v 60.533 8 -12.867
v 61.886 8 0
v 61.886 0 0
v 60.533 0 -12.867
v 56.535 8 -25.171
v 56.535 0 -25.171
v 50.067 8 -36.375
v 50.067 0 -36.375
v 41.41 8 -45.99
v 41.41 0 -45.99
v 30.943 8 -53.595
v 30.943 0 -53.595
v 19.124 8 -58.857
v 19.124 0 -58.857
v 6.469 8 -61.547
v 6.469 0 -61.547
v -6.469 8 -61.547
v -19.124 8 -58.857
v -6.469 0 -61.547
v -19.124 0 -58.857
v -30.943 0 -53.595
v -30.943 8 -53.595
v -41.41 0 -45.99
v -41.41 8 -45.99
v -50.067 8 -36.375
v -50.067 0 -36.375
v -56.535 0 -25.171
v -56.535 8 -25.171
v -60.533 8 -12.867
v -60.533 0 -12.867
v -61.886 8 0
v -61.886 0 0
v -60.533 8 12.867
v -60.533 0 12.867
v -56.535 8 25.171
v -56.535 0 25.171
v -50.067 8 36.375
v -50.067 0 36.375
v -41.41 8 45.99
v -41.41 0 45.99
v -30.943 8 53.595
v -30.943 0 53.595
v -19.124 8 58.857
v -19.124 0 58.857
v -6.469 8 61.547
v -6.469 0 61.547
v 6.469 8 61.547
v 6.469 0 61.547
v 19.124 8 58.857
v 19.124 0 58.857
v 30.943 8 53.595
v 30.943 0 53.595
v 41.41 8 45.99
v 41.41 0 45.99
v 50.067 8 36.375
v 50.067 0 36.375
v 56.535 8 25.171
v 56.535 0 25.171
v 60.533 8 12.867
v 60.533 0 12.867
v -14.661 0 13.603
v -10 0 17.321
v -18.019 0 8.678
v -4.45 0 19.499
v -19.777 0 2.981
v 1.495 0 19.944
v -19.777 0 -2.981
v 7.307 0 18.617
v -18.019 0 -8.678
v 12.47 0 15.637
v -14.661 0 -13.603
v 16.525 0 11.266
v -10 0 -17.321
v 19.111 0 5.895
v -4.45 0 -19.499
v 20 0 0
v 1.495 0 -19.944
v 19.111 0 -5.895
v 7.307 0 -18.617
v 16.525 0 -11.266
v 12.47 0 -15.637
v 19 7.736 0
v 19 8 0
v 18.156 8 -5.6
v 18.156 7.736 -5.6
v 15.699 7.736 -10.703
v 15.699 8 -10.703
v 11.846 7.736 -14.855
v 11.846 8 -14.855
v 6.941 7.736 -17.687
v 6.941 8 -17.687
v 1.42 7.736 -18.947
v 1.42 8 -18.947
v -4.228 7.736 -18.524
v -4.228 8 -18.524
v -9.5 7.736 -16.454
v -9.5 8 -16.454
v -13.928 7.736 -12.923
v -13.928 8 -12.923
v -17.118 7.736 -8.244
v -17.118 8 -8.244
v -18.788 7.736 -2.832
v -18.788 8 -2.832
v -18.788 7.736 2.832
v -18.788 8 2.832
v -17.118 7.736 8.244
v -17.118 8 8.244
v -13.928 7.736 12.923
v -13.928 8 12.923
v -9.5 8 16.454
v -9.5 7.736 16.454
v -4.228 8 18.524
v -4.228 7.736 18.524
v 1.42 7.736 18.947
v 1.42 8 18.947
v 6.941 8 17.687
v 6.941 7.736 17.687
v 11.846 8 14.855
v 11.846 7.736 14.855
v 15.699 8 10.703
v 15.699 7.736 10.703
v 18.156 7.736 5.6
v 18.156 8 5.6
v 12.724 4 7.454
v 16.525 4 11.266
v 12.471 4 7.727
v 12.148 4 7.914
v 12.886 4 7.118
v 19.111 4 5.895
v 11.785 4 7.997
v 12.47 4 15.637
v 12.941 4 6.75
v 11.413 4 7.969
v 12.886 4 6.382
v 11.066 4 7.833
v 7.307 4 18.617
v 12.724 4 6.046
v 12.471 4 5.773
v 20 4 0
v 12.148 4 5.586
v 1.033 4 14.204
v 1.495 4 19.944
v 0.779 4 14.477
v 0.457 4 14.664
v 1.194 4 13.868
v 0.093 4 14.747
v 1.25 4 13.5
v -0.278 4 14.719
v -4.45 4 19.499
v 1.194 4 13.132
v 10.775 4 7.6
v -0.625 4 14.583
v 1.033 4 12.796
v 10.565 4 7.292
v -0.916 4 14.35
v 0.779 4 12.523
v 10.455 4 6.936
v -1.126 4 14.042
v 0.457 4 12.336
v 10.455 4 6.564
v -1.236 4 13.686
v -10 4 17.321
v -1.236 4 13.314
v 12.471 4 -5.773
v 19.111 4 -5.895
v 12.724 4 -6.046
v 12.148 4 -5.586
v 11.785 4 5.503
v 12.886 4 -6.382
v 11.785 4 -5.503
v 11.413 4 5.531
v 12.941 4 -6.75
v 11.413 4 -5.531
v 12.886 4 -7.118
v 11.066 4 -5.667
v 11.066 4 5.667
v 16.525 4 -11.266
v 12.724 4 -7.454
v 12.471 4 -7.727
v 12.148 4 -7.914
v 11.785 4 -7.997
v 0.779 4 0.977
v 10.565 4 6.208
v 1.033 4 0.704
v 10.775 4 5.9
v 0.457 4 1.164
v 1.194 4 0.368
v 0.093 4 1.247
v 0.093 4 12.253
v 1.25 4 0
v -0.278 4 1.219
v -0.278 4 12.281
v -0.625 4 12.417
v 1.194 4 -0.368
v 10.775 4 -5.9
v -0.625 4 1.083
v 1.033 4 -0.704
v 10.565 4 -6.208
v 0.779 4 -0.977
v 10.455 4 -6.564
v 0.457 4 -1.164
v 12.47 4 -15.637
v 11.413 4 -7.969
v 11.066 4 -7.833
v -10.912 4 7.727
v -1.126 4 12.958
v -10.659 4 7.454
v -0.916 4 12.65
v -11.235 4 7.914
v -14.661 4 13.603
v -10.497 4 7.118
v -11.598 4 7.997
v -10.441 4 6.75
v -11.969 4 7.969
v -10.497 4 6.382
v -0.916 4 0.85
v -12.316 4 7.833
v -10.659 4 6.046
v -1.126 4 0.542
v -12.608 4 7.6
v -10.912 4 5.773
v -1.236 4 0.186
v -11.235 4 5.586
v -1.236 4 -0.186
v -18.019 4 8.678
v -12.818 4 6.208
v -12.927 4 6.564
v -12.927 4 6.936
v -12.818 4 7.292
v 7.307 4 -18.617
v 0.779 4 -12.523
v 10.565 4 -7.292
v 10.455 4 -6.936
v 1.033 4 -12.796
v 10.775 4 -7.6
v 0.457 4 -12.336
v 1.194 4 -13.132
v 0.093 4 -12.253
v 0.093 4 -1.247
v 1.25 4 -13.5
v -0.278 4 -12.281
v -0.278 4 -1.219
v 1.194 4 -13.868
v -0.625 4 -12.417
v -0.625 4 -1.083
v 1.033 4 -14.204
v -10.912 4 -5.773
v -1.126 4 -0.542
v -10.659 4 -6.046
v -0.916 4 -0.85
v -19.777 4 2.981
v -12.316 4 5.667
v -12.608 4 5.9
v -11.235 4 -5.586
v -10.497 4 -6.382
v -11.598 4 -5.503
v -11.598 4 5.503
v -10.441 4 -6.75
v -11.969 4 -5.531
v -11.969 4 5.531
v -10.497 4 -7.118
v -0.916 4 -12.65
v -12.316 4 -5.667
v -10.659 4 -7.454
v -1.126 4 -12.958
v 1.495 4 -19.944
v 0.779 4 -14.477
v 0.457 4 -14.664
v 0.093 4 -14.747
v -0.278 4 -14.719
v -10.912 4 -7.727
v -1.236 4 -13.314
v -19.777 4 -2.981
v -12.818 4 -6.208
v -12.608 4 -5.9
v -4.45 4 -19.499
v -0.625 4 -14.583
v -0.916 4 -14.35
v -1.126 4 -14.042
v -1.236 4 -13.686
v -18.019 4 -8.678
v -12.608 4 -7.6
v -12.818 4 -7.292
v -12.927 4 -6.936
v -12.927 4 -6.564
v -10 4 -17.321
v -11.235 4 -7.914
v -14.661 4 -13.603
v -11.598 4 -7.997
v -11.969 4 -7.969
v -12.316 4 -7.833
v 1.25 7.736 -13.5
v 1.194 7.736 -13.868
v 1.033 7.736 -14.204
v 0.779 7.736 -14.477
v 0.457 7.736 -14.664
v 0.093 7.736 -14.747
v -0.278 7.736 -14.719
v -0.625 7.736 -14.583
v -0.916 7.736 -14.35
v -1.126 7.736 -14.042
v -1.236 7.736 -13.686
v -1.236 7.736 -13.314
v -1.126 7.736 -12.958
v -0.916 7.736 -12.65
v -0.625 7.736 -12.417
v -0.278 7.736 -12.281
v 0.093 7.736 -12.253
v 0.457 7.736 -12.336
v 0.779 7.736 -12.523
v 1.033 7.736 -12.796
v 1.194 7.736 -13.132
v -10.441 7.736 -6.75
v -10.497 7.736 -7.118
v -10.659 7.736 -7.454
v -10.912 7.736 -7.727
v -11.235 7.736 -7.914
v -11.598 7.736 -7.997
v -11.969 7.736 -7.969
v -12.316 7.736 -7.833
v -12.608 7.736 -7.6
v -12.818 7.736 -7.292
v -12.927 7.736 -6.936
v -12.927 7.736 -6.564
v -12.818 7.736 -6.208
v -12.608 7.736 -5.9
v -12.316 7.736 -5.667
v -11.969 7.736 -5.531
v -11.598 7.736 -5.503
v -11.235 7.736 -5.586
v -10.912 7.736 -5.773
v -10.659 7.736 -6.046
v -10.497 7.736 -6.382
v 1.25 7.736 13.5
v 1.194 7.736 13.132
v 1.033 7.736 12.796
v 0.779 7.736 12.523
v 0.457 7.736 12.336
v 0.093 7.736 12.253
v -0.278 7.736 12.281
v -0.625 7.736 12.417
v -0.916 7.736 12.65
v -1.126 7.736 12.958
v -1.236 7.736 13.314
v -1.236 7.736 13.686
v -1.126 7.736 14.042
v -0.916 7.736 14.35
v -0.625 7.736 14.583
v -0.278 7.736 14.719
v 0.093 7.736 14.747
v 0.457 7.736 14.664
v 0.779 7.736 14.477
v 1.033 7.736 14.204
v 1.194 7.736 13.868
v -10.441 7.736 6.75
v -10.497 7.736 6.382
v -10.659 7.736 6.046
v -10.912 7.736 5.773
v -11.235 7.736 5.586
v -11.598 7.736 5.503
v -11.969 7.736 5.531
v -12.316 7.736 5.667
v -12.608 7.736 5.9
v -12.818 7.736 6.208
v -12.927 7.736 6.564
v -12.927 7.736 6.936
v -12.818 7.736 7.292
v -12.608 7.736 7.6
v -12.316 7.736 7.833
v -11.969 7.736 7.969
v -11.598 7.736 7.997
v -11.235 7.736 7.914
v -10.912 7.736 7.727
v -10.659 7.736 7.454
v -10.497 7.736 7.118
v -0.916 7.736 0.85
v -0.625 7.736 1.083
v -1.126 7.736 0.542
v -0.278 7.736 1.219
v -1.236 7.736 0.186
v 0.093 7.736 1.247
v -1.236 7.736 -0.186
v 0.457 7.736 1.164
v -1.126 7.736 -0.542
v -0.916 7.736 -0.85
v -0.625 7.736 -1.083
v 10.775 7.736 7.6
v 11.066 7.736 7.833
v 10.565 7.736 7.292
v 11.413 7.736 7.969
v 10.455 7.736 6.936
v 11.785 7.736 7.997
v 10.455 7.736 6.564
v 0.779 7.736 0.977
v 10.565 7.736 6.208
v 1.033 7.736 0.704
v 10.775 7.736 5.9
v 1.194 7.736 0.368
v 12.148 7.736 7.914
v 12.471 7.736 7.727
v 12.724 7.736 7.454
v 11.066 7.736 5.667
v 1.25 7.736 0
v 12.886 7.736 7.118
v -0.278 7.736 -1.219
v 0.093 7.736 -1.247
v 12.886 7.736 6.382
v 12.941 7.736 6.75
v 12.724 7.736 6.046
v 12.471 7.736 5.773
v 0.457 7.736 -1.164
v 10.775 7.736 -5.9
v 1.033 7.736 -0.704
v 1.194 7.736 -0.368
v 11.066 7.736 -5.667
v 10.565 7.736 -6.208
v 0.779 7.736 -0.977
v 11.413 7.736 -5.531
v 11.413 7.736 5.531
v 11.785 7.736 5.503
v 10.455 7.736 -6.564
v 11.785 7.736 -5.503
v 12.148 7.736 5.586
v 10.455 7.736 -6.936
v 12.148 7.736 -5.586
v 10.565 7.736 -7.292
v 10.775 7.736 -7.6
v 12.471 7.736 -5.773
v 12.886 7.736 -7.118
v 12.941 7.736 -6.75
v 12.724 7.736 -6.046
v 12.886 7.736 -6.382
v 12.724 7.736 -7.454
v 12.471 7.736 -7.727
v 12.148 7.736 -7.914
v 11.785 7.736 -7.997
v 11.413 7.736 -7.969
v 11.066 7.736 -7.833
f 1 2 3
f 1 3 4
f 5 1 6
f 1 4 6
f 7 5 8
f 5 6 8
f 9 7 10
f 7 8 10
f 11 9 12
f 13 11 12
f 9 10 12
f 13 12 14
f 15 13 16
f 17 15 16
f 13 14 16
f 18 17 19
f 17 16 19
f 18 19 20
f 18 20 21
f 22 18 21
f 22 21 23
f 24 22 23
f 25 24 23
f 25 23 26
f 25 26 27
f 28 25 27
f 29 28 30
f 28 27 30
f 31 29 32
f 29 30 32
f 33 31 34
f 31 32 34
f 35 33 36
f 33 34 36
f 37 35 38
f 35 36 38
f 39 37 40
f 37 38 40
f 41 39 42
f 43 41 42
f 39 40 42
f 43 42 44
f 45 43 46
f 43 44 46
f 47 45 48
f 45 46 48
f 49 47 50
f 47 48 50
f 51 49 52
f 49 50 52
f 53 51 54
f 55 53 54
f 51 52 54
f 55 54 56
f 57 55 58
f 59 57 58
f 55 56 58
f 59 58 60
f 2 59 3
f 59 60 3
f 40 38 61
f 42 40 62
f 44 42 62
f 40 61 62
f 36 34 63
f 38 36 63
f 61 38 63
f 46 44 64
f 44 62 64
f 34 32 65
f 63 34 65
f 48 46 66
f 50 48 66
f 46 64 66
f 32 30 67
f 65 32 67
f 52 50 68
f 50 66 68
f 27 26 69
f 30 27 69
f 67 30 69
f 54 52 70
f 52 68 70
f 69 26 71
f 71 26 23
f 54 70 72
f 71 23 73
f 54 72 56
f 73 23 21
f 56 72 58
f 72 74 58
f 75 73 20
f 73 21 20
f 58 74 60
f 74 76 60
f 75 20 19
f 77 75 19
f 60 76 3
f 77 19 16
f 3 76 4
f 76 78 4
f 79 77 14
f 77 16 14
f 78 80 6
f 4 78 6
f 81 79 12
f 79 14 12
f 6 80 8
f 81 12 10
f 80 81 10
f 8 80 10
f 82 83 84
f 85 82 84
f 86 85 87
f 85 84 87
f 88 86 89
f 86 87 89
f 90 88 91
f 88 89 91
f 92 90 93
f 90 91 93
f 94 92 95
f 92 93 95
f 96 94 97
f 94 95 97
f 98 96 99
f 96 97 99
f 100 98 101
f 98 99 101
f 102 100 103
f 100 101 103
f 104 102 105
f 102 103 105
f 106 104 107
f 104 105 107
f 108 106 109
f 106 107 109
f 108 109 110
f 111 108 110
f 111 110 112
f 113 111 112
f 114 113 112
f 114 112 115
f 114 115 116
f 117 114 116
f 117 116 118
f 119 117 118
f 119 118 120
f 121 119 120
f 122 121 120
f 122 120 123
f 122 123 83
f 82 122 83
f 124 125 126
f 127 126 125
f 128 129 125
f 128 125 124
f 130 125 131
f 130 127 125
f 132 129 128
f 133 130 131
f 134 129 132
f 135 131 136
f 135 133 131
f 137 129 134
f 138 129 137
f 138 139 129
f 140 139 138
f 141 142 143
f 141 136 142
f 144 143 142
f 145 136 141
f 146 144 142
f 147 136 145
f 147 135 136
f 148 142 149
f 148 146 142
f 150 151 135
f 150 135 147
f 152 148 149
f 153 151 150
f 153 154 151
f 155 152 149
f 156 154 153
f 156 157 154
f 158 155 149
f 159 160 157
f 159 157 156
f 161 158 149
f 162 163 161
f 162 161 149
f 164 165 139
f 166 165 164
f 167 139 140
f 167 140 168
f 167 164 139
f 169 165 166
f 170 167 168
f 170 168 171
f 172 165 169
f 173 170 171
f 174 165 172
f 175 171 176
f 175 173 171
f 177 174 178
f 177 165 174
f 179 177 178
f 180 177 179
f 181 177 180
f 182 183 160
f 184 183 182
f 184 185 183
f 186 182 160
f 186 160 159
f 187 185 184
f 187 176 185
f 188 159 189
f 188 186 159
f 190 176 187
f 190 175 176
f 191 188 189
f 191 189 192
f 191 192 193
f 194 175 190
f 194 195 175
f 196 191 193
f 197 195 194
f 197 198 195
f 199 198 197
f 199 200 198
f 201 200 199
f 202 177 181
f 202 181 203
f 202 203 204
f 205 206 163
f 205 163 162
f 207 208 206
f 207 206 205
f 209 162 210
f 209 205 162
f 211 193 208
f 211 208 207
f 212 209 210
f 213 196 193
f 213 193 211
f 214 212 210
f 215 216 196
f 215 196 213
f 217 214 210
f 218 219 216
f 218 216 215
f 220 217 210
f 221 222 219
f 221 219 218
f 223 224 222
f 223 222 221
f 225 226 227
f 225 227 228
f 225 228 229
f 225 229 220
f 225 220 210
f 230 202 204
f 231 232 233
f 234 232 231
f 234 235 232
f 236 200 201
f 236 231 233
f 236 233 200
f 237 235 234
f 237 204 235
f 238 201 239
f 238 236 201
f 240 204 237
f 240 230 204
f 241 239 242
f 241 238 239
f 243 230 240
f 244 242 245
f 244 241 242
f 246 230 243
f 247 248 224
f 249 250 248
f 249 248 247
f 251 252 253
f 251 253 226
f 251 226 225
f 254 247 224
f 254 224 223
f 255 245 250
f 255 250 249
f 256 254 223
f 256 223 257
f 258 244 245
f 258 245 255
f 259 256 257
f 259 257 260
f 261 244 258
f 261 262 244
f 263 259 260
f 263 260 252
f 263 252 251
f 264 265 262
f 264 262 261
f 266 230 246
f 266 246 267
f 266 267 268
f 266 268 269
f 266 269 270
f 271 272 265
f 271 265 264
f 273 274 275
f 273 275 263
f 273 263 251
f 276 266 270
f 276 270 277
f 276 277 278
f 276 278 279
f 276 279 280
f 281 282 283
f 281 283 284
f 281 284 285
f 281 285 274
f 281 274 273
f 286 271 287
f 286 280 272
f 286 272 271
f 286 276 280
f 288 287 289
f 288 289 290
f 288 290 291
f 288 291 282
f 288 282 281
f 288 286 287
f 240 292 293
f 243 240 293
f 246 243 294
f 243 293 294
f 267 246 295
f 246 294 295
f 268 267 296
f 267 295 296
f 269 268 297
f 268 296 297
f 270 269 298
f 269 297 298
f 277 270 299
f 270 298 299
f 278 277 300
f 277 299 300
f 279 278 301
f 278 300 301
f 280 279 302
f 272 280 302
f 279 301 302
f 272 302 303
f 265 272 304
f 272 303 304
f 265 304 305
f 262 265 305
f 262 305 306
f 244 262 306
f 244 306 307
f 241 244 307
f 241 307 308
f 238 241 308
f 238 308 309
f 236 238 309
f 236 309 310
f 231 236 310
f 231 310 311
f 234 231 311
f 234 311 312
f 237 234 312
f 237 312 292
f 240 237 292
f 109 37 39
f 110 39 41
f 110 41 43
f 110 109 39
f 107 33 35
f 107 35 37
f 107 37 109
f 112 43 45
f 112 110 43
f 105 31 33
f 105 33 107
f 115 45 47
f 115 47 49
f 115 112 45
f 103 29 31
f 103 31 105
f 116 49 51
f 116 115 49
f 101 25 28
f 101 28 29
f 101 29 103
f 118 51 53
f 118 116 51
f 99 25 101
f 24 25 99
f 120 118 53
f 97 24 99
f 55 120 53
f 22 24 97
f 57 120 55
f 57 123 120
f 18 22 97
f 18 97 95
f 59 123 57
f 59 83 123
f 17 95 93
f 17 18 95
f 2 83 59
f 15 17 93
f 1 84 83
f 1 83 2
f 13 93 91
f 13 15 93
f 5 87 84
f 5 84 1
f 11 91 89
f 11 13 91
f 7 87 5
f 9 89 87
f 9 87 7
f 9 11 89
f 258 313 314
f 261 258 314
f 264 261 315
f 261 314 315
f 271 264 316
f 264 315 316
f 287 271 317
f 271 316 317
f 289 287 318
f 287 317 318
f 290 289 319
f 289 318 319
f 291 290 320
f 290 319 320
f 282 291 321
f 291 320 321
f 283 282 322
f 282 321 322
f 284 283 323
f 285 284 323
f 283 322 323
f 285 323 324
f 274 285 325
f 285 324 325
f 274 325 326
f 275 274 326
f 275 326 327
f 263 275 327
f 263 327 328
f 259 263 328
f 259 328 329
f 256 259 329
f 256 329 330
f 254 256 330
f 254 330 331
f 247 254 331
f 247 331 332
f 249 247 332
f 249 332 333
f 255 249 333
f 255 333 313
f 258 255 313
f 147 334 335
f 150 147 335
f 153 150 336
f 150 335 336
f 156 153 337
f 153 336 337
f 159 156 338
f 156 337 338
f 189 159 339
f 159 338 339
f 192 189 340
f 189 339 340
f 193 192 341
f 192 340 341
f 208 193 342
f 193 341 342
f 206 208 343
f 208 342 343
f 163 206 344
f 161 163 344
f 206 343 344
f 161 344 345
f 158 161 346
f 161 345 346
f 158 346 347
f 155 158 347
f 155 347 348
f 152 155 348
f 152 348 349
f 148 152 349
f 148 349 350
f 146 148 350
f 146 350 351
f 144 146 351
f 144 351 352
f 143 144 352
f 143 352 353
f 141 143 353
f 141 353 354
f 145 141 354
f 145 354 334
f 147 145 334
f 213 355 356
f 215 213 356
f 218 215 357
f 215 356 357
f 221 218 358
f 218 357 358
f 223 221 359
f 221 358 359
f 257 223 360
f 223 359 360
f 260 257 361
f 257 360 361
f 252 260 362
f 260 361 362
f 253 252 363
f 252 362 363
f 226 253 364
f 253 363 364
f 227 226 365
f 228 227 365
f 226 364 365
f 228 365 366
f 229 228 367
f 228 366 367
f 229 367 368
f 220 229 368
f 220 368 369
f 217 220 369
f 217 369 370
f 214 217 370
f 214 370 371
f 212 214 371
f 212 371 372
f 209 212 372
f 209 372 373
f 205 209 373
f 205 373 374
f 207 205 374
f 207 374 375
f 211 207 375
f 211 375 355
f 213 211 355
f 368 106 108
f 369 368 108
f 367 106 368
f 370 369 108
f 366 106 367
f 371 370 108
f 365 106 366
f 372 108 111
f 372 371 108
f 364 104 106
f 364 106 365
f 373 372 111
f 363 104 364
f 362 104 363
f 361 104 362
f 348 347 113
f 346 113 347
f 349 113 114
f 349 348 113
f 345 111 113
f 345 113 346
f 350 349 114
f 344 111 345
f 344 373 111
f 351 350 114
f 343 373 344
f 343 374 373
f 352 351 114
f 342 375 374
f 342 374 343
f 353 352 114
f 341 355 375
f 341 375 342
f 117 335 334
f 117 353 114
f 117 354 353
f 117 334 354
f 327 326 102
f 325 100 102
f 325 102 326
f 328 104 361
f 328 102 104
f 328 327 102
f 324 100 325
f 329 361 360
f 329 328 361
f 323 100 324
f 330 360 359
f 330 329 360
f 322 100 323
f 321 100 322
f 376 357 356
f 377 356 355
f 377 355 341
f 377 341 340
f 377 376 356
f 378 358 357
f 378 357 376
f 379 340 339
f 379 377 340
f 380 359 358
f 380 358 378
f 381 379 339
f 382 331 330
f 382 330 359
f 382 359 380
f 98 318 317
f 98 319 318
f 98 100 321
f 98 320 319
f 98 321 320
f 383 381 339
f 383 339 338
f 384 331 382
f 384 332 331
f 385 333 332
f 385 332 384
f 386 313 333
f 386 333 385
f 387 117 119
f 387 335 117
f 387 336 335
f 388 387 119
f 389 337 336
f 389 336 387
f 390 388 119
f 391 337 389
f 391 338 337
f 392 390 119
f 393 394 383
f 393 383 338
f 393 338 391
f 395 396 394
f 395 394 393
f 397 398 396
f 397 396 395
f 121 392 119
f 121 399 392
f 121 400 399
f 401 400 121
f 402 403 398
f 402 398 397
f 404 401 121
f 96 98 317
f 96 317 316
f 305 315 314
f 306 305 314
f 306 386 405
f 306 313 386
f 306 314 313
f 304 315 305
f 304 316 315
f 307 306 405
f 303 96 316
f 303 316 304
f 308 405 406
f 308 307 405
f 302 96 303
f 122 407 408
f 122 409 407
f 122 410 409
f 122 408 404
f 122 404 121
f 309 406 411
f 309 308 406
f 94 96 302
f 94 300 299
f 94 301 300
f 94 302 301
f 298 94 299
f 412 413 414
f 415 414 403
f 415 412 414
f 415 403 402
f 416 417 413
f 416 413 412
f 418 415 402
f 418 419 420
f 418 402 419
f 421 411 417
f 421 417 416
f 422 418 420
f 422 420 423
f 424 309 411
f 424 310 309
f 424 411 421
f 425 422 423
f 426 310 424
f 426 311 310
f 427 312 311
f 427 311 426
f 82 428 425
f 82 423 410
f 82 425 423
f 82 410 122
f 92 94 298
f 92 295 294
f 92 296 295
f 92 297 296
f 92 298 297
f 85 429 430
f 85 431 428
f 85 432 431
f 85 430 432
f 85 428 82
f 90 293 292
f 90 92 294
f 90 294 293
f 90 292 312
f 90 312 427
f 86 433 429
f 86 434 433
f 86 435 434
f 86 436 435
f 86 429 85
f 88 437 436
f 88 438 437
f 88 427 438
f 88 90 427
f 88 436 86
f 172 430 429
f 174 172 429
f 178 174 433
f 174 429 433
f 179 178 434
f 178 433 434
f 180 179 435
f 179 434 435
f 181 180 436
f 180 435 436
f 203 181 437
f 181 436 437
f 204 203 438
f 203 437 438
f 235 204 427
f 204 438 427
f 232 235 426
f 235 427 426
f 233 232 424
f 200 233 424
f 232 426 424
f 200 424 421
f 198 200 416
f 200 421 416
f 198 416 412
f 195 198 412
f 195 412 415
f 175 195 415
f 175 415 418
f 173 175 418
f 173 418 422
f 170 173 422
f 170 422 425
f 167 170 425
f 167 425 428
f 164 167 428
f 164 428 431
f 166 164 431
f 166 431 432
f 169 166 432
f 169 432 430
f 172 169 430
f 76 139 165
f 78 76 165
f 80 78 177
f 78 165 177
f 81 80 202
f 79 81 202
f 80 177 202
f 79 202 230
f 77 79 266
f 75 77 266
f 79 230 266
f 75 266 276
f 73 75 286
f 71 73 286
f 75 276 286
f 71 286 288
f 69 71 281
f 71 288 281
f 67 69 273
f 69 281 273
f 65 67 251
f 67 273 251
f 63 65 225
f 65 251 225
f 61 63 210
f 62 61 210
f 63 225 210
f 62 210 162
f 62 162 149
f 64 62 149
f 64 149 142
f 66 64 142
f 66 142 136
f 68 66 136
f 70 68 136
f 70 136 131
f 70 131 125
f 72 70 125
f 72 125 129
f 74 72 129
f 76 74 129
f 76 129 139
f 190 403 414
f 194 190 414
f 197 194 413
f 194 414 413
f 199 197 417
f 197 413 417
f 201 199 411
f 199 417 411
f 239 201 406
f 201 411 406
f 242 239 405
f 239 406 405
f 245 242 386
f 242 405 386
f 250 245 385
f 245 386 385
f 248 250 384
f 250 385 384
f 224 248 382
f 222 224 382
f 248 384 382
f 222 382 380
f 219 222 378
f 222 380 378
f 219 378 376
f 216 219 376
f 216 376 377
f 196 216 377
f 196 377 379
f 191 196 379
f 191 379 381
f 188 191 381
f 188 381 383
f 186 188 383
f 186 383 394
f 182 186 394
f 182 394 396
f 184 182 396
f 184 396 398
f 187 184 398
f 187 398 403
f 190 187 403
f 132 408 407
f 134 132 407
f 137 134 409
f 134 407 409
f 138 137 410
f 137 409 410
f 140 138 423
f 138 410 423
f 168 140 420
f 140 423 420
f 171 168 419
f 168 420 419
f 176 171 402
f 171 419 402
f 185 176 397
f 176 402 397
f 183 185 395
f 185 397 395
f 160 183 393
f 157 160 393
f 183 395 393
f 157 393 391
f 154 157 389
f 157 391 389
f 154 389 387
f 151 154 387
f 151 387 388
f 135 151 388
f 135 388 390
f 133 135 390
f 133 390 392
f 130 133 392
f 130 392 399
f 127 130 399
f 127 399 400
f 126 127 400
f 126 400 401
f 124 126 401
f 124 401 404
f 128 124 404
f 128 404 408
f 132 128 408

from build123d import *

# Parameters (mm, degrees)
CROQUIS1_R              = 61.885645
SALIENTE_EXTRUIR1_DEPTH = 8
CROQUIS2_R              = 20
CORTAR_EXTRUIR1_DEPTH   = 8
CROQUIS3_R              = 20
SALIENTE_EXTRUIR2_DEPTH = 4
CROQUIS4_R              = 19
SALIENTE_EXTRUIR3_DEPTH = 8.1661
CROQUIS5_R              = 1.25
CORTAR_EXTRUIR2_DEPTH   = 8.1661
CROQUIS6_R              = 1.25
CORTAR_EXTRUIR3_DEPTH   = 8.1661
CROQUIS7_R              = 19
CORTAR_EXTRUIR4_DEPTH   = 4.43


with BuildPart() as part:
    # Croquis1 → Saliente-Extruir1 (new body)
    with BuildSketch(Plane(origin=(0, 0, 0), x_dir=(1, 0, 0), z_dir=(0, 1, 0))):
        Circle(CROQUIS1_R)
    extrude(amount=SALIENTE_EXTRUIR1_DEPTH)

    # Croquis2 → Cortar-Extruir1 (cut)
    with BuildSketch(Plane(origin=(0, 8, 0), x_dir=(1, 0, 0), z_dir=(0, 1, 0))):
        Circle(CROQUIS2_R)
    extrude(amount=-CORTAR_EXTRUIR1_DEPTH, mode=Mode.SUBTRACT)

    # Croquis3 → Saliente-Extruir2 (add)
    with BuildSketch(Plane(origin=(0, 8, 0), x_dir=(1, 0, 0), z_dir=(0, 1, 0))):
        Circle(CROQUIS3_R)
    extrude(amount=-SALIENTE_EXTRUIR2_DEPTH)

    # Croquis4 → Saliente-Extruir3 (add)
    with BuildSketch(Plane(origin=(0, 4, 0), x_dir=(-1, 0, 0), z_dir=(0, -1, 0))):
        Circle(CROQUIS4_R)
    extrude(amount=-SALIENTE_EXTRUIR3_DEPTH)

    # Croquis5 → Cortar-Extruir2 (cut)
    with BuildSketch(Plane(origin=(0, 12.1661, 0), x_dir=(1, 0, 0), z_dir=(0, 1, 0))):
        with Locations((11.691342951, 6.75)):
            Circle(CROQUIS5_R)
        with Locations((0, 13.5)):
            Circle(CROQUIS5_R)
        with Locations((-11.691342951, 6.75)):
            Circle(CROQUIS5_R)
        with Locations((-11.691342951, -6.75)):
            Circle(CROQUIS5_R)
        with Locations((0, -13.5)):
            Circle(CROQUIS5_R)
        with Locations((11.691342951, -6.75)):
            Circle(CROQUIS5_R)
    extrude(amount=-CORTAR_EXTRUIR2_DEPTH, mode=Mode.SUBTRACT)

    # Croquis6 → Cortar-Extruir3 (cut)
    with BuildSketch(Plane(origin=(0, 12.1661, 0), x_dir=(1, 0, 0), z_dir=(0, 1, 0))):
        Circle(CROQUIS6_R)
    extrude(amount=-CORTAR_EXTRUIR3_DEPTH, mode=Mode.SUBTRACT)

    # Croquis7 → Cortar-Extruir4 (cut)
    with BuildSketch(Plane(origin=(0, 12.1661, 0), x_dir=(1, 0, 0), z_dir=(0, 1, 0))):
        Circle(CROQUIS7_R)
    extrude(amount=-CORTAR_EXTRUIR4_DEPTH, mode=Mode.SUBTRACT)


solid = part.part
